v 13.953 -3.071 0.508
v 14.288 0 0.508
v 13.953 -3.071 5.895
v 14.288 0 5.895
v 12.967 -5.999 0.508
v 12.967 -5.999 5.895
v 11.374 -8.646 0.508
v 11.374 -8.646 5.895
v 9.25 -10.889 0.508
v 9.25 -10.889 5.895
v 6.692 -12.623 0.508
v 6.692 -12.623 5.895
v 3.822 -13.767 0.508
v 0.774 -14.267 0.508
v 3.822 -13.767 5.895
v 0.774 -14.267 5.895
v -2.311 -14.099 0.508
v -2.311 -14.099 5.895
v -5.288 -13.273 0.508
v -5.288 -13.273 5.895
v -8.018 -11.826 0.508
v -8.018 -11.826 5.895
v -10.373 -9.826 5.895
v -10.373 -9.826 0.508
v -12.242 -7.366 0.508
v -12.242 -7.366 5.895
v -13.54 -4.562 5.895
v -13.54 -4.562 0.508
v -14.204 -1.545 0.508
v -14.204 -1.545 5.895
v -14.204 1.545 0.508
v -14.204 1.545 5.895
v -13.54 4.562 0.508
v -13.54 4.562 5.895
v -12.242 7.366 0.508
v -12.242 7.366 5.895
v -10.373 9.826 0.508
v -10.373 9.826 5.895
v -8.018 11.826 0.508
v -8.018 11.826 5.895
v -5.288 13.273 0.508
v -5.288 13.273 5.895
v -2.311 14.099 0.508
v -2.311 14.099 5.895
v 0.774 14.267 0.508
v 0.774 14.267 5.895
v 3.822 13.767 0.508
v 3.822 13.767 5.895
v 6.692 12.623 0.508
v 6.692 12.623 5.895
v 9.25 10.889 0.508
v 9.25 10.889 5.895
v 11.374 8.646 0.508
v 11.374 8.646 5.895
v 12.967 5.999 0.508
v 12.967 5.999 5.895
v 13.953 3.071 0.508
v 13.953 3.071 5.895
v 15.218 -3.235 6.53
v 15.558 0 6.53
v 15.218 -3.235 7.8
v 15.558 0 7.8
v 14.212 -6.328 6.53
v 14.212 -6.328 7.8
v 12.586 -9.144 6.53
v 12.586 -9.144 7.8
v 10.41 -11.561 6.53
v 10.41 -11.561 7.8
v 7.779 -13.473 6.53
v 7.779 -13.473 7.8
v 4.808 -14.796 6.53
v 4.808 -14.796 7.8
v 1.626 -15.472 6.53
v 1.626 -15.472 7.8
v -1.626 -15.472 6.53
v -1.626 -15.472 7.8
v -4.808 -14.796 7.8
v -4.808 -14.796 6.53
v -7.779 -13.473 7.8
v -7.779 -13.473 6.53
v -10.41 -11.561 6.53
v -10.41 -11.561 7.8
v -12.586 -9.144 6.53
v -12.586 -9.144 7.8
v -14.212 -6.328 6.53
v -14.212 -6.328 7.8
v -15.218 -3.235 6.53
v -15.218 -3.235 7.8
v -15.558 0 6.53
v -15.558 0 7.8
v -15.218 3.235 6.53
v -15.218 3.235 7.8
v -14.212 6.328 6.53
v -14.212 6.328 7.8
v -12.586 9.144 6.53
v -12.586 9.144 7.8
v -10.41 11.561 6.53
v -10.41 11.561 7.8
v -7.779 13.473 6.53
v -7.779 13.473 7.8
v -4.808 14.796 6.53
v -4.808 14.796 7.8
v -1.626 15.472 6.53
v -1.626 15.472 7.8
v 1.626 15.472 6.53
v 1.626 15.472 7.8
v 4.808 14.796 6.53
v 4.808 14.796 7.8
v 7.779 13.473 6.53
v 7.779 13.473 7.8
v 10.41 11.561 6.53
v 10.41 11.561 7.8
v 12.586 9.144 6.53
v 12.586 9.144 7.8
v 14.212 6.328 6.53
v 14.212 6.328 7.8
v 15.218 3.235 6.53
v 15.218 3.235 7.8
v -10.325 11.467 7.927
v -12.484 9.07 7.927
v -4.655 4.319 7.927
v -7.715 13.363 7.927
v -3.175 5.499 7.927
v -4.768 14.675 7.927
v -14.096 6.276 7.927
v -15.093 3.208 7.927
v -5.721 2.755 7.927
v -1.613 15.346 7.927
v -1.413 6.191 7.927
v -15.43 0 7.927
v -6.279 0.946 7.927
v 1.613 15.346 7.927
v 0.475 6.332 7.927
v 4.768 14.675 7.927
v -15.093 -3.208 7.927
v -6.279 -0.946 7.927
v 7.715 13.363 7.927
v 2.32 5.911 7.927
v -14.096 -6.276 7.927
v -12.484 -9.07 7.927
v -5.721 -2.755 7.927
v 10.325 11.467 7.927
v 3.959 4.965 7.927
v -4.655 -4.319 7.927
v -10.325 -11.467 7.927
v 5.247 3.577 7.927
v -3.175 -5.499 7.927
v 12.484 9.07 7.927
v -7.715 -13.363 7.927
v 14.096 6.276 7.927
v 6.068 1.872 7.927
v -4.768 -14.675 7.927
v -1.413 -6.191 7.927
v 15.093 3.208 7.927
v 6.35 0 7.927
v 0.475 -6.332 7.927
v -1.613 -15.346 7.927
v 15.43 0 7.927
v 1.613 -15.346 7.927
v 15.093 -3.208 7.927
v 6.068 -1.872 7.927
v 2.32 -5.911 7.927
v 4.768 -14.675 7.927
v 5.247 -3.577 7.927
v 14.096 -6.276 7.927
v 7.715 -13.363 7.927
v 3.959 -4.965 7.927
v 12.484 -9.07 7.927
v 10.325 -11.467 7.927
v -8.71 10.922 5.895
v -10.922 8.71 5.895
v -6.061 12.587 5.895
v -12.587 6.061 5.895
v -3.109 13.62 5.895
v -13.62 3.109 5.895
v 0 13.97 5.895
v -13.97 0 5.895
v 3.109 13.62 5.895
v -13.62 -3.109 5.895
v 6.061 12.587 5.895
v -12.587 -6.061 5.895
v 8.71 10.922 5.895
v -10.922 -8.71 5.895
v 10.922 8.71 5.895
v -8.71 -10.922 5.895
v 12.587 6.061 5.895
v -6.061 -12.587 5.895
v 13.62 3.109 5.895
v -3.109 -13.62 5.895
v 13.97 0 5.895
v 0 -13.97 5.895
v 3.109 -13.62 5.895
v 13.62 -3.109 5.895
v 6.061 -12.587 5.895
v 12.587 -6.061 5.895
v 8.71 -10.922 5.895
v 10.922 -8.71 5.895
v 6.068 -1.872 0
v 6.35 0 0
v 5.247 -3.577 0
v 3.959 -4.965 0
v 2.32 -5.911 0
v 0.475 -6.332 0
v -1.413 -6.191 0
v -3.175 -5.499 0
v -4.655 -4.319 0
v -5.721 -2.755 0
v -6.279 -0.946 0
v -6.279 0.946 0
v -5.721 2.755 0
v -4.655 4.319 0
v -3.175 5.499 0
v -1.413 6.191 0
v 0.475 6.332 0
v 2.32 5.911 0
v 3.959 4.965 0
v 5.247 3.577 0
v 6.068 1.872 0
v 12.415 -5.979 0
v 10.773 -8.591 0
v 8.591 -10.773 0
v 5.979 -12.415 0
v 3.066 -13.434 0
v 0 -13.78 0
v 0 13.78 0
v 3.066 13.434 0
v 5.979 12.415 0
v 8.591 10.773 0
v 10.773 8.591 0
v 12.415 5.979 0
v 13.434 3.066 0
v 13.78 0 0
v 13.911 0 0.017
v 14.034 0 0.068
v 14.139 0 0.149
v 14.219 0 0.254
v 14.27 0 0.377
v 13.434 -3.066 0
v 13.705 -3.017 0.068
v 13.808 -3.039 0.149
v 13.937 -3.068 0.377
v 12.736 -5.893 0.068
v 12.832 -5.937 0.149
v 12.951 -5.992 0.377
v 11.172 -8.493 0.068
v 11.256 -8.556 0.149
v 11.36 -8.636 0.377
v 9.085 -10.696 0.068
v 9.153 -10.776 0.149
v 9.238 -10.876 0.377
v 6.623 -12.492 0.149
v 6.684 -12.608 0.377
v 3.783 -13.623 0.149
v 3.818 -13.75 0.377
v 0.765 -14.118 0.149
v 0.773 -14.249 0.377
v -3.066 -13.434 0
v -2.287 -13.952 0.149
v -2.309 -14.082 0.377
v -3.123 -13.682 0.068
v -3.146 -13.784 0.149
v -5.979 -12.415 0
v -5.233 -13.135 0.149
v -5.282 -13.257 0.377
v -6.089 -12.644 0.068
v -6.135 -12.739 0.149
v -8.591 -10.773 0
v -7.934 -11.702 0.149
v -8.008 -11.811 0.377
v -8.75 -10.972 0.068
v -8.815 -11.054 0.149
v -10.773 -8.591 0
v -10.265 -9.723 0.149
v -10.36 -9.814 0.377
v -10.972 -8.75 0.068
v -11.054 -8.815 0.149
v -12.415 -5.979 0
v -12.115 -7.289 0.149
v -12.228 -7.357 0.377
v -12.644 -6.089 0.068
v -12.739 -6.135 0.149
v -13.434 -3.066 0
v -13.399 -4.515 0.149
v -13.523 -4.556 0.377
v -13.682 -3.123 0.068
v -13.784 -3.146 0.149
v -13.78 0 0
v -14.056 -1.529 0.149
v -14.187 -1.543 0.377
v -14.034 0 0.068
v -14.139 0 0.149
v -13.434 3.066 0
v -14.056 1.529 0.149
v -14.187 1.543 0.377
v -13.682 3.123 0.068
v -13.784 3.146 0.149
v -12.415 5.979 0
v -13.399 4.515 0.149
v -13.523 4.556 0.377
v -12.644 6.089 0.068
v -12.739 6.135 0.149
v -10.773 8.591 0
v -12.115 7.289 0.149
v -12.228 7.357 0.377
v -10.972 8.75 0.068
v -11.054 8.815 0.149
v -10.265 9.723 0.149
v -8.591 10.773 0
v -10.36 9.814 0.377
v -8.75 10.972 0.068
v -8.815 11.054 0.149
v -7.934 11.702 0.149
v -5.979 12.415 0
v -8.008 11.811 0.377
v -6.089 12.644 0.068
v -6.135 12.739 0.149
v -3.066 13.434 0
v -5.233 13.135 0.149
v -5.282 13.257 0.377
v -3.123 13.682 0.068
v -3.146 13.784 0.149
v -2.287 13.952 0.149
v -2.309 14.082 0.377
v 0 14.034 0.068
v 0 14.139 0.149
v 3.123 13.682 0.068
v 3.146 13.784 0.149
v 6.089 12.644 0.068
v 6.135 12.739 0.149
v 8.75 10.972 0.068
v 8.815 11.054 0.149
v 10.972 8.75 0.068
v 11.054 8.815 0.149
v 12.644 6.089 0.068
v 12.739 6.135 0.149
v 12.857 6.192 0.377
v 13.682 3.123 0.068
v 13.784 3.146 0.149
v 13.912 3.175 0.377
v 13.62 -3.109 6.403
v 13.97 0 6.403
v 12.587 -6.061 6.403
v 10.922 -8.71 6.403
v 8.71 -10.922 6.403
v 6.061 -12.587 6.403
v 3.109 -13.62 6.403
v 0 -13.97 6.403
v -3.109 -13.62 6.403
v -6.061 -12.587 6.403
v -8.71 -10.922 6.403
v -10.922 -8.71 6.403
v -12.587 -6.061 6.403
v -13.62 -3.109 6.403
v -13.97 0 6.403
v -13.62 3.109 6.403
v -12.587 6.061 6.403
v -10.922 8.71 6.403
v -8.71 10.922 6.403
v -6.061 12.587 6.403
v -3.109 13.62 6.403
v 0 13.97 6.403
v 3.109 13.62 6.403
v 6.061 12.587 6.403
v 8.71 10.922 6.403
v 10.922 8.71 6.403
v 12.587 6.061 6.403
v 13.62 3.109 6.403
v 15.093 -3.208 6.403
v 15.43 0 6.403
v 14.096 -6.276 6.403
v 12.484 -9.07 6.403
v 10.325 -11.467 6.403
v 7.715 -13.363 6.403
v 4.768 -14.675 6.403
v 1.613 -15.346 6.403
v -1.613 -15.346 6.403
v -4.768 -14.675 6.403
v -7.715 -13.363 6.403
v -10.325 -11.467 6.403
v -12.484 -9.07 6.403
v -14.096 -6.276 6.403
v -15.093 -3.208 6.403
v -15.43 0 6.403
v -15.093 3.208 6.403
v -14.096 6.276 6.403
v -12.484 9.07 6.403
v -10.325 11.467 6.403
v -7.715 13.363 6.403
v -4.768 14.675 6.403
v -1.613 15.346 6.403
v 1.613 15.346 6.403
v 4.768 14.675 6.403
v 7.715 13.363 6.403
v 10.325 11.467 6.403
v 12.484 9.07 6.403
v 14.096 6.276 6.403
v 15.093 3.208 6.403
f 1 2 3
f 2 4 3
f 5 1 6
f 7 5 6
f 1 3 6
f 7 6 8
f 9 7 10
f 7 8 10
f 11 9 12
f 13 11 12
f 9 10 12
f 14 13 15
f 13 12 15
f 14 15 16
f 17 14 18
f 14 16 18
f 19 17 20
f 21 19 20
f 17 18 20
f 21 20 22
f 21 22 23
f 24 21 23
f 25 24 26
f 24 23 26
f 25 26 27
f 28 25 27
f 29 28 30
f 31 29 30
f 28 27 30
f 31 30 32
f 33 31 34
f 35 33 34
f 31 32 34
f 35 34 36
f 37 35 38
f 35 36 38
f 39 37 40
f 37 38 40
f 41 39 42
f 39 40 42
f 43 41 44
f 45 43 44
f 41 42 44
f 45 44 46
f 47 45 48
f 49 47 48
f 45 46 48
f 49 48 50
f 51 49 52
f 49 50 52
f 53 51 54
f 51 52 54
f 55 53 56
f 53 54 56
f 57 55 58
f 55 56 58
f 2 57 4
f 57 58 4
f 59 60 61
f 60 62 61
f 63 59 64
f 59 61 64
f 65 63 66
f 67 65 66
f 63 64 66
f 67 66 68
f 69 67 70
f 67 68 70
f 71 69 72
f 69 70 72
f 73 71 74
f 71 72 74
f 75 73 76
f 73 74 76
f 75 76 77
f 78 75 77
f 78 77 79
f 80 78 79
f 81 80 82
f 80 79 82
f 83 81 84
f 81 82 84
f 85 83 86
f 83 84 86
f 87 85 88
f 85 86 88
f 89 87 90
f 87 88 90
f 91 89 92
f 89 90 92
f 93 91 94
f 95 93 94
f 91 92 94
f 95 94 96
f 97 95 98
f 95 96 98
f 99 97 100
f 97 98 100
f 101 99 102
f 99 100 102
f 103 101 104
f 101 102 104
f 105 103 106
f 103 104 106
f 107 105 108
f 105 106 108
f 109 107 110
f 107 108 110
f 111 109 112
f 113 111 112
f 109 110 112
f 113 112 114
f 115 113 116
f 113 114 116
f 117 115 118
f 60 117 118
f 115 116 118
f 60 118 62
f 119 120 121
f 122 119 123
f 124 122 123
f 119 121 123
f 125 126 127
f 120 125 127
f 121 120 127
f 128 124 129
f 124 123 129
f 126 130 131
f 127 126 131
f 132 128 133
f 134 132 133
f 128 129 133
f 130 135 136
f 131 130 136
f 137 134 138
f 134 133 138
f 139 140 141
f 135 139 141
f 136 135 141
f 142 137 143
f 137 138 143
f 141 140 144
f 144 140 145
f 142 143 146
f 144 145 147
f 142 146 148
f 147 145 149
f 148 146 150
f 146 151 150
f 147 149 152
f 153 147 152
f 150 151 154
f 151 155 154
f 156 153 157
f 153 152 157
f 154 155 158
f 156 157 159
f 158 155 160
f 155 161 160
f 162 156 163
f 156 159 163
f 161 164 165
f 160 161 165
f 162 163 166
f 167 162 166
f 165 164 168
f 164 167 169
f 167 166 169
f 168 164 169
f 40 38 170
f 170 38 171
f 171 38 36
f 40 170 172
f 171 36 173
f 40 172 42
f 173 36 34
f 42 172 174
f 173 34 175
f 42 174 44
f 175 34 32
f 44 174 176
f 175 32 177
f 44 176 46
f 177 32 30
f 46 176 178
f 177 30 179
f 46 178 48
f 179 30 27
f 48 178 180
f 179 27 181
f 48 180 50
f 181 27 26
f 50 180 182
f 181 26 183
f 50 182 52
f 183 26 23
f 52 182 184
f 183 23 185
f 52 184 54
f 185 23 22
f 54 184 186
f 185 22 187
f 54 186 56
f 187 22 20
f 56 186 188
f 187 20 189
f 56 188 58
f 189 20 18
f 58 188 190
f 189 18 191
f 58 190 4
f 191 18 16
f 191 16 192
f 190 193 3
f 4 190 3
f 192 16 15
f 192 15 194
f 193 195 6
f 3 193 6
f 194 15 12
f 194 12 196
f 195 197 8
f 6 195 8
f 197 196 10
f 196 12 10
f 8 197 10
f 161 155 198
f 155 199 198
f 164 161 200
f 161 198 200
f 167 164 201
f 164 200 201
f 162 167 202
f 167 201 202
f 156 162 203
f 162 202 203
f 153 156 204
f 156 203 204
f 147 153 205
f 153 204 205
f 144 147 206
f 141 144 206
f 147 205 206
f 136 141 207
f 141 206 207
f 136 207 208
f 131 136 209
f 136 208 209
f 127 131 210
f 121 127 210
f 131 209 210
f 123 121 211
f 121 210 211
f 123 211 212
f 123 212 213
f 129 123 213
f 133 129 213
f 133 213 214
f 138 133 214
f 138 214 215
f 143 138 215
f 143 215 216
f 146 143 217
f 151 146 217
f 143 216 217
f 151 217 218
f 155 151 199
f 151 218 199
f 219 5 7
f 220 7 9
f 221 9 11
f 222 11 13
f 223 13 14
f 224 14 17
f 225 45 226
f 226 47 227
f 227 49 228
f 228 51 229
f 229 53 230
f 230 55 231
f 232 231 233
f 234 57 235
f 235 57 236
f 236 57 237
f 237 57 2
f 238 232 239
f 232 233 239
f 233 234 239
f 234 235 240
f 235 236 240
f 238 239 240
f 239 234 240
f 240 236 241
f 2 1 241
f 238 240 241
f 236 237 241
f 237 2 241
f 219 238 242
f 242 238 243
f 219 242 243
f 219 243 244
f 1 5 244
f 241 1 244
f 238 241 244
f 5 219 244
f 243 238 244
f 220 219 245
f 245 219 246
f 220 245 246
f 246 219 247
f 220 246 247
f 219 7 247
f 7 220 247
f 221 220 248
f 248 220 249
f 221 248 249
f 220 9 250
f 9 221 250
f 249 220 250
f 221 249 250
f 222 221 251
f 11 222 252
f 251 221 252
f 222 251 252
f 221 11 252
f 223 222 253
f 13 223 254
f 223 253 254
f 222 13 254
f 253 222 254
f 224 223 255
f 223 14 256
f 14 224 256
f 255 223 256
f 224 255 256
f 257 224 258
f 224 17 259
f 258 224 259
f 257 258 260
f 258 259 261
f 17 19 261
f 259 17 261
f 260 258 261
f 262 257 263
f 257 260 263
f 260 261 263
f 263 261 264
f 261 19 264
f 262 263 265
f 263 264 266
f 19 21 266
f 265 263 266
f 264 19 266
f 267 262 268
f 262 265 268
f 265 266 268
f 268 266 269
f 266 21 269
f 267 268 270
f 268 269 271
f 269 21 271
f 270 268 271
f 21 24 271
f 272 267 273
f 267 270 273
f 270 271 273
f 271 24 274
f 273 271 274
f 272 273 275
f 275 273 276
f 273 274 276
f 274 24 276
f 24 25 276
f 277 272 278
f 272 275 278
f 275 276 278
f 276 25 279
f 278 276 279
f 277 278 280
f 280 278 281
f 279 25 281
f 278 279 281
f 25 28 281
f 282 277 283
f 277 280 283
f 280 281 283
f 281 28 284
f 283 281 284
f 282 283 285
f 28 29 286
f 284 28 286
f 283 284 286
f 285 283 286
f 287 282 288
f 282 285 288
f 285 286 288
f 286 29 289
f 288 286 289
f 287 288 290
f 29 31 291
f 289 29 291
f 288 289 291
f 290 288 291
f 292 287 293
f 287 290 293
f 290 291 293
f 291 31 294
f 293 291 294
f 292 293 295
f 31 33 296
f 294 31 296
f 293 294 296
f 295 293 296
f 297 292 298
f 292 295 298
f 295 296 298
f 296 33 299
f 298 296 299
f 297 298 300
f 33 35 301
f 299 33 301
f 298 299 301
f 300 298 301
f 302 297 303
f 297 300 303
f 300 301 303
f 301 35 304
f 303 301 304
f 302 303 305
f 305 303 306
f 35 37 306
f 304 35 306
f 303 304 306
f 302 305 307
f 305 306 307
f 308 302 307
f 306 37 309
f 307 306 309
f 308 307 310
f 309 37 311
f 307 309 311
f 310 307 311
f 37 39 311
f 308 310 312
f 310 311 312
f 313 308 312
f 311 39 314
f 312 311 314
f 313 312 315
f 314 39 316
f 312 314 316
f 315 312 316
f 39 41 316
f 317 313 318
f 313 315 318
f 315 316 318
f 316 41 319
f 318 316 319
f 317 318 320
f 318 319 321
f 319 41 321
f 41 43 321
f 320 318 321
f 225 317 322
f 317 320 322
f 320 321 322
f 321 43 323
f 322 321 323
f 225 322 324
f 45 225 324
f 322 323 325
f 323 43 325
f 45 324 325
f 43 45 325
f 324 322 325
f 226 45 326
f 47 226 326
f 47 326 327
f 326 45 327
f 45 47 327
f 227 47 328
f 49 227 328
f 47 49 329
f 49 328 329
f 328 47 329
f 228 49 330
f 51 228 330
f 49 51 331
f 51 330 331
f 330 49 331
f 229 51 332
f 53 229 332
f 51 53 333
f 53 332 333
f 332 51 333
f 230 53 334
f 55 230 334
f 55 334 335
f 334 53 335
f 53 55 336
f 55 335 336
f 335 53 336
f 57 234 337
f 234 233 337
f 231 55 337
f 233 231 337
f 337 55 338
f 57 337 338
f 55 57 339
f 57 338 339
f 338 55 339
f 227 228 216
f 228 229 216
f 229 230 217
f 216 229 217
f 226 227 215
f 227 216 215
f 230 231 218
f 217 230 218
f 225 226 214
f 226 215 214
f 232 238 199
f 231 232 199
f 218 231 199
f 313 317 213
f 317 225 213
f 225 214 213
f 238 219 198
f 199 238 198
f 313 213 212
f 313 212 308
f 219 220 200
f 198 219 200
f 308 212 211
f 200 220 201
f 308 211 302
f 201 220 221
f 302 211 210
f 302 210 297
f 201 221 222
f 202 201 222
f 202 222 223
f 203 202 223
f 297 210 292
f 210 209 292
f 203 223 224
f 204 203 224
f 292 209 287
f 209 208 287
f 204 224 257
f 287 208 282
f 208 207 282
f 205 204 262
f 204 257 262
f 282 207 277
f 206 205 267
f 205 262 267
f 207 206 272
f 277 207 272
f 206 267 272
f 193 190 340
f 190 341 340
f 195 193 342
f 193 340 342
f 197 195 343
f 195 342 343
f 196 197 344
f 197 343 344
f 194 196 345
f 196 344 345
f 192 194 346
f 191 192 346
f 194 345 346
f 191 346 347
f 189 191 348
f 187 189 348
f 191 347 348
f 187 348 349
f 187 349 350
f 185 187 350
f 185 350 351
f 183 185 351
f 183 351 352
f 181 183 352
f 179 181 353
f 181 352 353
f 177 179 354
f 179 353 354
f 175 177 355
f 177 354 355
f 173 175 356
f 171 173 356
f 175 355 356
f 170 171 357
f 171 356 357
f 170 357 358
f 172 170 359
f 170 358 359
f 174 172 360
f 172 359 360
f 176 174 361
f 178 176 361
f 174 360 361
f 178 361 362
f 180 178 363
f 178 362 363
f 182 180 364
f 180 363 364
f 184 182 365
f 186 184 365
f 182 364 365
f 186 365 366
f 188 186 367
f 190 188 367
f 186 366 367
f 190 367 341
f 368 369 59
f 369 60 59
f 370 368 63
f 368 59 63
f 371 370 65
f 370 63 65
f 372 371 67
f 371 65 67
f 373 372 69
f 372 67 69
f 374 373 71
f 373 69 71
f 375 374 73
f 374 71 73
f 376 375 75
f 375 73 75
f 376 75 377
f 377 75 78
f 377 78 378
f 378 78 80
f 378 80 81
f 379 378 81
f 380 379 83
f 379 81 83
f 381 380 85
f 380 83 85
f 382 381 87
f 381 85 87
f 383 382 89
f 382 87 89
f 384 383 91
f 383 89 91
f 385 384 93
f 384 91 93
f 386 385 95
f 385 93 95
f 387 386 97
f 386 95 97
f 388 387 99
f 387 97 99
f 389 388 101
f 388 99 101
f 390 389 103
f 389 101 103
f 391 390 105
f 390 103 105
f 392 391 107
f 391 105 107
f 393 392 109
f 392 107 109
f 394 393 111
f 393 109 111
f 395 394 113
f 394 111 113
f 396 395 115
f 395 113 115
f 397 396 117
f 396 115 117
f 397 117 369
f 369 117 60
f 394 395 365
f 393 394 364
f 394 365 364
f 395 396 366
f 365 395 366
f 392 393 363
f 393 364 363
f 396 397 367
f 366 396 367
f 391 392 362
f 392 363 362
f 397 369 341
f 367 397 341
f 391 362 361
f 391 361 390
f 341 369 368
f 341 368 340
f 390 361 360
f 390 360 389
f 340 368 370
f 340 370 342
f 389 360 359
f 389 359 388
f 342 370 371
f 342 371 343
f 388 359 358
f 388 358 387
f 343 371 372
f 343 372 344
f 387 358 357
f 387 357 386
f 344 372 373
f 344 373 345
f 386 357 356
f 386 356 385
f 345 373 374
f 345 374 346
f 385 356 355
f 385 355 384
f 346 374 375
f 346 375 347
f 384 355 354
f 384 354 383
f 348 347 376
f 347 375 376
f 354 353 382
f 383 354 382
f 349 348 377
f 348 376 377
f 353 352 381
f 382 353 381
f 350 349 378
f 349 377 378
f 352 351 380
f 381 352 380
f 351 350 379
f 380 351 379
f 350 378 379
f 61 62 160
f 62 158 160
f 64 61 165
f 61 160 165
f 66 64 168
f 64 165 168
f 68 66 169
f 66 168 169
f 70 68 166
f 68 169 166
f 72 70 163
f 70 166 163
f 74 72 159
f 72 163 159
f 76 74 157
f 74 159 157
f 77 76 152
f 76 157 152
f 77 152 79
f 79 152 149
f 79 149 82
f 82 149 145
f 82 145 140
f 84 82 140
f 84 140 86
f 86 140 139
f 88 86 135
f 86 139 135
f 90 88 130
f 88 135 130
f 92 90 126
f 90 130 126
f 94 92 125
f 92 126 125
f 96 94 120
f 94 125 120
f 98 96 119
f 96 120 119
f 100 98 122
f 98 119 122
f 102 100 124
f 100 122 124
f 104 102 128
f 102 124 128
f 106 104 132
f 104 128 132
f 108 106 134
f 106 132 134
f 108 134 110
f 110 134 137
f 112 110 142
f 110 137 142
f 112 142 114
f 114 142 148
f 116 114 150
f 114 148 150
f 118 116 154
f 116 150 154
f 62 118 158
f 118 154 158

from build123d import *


with BuildPart() as part:
    # Sketch1 → Revolve1 (revolve)
    with BuildSketch(Plane.XZ):
        with BuildLine():
            Line((14.2875, 0.508), (14.2875, 5.89534))
            Line((14.2875, 5.89534), (13.97, 5.89534))
            Line((13.97, 5.89534), (13.97, 6.40334))
            Line((13.97, 6.40334), (15.4305, 6.40334))
            Line((15.4305, 6.40334), (15.5575, 6.53034))
            Line((15.5575, 6.53034), (15.5575, 7.80034))
            Line((15.5575, 7.80034), (15.4305, 7.92734))
            Line((15.4305, 7.92734), (6.35, 7.92734))
            Line((6.35, 7.92734), (6.35, 0))
            Line((6.35, 0), (13.7795, 0))
            ThreePointArc((13.7795, 0), (14.138710245, 0.148789755), (14.2875, 0.508))
        make_face()
    revolve(axis=Axis((0, 0, 7.92734), (0, 0, -1)))


solid = part.part
